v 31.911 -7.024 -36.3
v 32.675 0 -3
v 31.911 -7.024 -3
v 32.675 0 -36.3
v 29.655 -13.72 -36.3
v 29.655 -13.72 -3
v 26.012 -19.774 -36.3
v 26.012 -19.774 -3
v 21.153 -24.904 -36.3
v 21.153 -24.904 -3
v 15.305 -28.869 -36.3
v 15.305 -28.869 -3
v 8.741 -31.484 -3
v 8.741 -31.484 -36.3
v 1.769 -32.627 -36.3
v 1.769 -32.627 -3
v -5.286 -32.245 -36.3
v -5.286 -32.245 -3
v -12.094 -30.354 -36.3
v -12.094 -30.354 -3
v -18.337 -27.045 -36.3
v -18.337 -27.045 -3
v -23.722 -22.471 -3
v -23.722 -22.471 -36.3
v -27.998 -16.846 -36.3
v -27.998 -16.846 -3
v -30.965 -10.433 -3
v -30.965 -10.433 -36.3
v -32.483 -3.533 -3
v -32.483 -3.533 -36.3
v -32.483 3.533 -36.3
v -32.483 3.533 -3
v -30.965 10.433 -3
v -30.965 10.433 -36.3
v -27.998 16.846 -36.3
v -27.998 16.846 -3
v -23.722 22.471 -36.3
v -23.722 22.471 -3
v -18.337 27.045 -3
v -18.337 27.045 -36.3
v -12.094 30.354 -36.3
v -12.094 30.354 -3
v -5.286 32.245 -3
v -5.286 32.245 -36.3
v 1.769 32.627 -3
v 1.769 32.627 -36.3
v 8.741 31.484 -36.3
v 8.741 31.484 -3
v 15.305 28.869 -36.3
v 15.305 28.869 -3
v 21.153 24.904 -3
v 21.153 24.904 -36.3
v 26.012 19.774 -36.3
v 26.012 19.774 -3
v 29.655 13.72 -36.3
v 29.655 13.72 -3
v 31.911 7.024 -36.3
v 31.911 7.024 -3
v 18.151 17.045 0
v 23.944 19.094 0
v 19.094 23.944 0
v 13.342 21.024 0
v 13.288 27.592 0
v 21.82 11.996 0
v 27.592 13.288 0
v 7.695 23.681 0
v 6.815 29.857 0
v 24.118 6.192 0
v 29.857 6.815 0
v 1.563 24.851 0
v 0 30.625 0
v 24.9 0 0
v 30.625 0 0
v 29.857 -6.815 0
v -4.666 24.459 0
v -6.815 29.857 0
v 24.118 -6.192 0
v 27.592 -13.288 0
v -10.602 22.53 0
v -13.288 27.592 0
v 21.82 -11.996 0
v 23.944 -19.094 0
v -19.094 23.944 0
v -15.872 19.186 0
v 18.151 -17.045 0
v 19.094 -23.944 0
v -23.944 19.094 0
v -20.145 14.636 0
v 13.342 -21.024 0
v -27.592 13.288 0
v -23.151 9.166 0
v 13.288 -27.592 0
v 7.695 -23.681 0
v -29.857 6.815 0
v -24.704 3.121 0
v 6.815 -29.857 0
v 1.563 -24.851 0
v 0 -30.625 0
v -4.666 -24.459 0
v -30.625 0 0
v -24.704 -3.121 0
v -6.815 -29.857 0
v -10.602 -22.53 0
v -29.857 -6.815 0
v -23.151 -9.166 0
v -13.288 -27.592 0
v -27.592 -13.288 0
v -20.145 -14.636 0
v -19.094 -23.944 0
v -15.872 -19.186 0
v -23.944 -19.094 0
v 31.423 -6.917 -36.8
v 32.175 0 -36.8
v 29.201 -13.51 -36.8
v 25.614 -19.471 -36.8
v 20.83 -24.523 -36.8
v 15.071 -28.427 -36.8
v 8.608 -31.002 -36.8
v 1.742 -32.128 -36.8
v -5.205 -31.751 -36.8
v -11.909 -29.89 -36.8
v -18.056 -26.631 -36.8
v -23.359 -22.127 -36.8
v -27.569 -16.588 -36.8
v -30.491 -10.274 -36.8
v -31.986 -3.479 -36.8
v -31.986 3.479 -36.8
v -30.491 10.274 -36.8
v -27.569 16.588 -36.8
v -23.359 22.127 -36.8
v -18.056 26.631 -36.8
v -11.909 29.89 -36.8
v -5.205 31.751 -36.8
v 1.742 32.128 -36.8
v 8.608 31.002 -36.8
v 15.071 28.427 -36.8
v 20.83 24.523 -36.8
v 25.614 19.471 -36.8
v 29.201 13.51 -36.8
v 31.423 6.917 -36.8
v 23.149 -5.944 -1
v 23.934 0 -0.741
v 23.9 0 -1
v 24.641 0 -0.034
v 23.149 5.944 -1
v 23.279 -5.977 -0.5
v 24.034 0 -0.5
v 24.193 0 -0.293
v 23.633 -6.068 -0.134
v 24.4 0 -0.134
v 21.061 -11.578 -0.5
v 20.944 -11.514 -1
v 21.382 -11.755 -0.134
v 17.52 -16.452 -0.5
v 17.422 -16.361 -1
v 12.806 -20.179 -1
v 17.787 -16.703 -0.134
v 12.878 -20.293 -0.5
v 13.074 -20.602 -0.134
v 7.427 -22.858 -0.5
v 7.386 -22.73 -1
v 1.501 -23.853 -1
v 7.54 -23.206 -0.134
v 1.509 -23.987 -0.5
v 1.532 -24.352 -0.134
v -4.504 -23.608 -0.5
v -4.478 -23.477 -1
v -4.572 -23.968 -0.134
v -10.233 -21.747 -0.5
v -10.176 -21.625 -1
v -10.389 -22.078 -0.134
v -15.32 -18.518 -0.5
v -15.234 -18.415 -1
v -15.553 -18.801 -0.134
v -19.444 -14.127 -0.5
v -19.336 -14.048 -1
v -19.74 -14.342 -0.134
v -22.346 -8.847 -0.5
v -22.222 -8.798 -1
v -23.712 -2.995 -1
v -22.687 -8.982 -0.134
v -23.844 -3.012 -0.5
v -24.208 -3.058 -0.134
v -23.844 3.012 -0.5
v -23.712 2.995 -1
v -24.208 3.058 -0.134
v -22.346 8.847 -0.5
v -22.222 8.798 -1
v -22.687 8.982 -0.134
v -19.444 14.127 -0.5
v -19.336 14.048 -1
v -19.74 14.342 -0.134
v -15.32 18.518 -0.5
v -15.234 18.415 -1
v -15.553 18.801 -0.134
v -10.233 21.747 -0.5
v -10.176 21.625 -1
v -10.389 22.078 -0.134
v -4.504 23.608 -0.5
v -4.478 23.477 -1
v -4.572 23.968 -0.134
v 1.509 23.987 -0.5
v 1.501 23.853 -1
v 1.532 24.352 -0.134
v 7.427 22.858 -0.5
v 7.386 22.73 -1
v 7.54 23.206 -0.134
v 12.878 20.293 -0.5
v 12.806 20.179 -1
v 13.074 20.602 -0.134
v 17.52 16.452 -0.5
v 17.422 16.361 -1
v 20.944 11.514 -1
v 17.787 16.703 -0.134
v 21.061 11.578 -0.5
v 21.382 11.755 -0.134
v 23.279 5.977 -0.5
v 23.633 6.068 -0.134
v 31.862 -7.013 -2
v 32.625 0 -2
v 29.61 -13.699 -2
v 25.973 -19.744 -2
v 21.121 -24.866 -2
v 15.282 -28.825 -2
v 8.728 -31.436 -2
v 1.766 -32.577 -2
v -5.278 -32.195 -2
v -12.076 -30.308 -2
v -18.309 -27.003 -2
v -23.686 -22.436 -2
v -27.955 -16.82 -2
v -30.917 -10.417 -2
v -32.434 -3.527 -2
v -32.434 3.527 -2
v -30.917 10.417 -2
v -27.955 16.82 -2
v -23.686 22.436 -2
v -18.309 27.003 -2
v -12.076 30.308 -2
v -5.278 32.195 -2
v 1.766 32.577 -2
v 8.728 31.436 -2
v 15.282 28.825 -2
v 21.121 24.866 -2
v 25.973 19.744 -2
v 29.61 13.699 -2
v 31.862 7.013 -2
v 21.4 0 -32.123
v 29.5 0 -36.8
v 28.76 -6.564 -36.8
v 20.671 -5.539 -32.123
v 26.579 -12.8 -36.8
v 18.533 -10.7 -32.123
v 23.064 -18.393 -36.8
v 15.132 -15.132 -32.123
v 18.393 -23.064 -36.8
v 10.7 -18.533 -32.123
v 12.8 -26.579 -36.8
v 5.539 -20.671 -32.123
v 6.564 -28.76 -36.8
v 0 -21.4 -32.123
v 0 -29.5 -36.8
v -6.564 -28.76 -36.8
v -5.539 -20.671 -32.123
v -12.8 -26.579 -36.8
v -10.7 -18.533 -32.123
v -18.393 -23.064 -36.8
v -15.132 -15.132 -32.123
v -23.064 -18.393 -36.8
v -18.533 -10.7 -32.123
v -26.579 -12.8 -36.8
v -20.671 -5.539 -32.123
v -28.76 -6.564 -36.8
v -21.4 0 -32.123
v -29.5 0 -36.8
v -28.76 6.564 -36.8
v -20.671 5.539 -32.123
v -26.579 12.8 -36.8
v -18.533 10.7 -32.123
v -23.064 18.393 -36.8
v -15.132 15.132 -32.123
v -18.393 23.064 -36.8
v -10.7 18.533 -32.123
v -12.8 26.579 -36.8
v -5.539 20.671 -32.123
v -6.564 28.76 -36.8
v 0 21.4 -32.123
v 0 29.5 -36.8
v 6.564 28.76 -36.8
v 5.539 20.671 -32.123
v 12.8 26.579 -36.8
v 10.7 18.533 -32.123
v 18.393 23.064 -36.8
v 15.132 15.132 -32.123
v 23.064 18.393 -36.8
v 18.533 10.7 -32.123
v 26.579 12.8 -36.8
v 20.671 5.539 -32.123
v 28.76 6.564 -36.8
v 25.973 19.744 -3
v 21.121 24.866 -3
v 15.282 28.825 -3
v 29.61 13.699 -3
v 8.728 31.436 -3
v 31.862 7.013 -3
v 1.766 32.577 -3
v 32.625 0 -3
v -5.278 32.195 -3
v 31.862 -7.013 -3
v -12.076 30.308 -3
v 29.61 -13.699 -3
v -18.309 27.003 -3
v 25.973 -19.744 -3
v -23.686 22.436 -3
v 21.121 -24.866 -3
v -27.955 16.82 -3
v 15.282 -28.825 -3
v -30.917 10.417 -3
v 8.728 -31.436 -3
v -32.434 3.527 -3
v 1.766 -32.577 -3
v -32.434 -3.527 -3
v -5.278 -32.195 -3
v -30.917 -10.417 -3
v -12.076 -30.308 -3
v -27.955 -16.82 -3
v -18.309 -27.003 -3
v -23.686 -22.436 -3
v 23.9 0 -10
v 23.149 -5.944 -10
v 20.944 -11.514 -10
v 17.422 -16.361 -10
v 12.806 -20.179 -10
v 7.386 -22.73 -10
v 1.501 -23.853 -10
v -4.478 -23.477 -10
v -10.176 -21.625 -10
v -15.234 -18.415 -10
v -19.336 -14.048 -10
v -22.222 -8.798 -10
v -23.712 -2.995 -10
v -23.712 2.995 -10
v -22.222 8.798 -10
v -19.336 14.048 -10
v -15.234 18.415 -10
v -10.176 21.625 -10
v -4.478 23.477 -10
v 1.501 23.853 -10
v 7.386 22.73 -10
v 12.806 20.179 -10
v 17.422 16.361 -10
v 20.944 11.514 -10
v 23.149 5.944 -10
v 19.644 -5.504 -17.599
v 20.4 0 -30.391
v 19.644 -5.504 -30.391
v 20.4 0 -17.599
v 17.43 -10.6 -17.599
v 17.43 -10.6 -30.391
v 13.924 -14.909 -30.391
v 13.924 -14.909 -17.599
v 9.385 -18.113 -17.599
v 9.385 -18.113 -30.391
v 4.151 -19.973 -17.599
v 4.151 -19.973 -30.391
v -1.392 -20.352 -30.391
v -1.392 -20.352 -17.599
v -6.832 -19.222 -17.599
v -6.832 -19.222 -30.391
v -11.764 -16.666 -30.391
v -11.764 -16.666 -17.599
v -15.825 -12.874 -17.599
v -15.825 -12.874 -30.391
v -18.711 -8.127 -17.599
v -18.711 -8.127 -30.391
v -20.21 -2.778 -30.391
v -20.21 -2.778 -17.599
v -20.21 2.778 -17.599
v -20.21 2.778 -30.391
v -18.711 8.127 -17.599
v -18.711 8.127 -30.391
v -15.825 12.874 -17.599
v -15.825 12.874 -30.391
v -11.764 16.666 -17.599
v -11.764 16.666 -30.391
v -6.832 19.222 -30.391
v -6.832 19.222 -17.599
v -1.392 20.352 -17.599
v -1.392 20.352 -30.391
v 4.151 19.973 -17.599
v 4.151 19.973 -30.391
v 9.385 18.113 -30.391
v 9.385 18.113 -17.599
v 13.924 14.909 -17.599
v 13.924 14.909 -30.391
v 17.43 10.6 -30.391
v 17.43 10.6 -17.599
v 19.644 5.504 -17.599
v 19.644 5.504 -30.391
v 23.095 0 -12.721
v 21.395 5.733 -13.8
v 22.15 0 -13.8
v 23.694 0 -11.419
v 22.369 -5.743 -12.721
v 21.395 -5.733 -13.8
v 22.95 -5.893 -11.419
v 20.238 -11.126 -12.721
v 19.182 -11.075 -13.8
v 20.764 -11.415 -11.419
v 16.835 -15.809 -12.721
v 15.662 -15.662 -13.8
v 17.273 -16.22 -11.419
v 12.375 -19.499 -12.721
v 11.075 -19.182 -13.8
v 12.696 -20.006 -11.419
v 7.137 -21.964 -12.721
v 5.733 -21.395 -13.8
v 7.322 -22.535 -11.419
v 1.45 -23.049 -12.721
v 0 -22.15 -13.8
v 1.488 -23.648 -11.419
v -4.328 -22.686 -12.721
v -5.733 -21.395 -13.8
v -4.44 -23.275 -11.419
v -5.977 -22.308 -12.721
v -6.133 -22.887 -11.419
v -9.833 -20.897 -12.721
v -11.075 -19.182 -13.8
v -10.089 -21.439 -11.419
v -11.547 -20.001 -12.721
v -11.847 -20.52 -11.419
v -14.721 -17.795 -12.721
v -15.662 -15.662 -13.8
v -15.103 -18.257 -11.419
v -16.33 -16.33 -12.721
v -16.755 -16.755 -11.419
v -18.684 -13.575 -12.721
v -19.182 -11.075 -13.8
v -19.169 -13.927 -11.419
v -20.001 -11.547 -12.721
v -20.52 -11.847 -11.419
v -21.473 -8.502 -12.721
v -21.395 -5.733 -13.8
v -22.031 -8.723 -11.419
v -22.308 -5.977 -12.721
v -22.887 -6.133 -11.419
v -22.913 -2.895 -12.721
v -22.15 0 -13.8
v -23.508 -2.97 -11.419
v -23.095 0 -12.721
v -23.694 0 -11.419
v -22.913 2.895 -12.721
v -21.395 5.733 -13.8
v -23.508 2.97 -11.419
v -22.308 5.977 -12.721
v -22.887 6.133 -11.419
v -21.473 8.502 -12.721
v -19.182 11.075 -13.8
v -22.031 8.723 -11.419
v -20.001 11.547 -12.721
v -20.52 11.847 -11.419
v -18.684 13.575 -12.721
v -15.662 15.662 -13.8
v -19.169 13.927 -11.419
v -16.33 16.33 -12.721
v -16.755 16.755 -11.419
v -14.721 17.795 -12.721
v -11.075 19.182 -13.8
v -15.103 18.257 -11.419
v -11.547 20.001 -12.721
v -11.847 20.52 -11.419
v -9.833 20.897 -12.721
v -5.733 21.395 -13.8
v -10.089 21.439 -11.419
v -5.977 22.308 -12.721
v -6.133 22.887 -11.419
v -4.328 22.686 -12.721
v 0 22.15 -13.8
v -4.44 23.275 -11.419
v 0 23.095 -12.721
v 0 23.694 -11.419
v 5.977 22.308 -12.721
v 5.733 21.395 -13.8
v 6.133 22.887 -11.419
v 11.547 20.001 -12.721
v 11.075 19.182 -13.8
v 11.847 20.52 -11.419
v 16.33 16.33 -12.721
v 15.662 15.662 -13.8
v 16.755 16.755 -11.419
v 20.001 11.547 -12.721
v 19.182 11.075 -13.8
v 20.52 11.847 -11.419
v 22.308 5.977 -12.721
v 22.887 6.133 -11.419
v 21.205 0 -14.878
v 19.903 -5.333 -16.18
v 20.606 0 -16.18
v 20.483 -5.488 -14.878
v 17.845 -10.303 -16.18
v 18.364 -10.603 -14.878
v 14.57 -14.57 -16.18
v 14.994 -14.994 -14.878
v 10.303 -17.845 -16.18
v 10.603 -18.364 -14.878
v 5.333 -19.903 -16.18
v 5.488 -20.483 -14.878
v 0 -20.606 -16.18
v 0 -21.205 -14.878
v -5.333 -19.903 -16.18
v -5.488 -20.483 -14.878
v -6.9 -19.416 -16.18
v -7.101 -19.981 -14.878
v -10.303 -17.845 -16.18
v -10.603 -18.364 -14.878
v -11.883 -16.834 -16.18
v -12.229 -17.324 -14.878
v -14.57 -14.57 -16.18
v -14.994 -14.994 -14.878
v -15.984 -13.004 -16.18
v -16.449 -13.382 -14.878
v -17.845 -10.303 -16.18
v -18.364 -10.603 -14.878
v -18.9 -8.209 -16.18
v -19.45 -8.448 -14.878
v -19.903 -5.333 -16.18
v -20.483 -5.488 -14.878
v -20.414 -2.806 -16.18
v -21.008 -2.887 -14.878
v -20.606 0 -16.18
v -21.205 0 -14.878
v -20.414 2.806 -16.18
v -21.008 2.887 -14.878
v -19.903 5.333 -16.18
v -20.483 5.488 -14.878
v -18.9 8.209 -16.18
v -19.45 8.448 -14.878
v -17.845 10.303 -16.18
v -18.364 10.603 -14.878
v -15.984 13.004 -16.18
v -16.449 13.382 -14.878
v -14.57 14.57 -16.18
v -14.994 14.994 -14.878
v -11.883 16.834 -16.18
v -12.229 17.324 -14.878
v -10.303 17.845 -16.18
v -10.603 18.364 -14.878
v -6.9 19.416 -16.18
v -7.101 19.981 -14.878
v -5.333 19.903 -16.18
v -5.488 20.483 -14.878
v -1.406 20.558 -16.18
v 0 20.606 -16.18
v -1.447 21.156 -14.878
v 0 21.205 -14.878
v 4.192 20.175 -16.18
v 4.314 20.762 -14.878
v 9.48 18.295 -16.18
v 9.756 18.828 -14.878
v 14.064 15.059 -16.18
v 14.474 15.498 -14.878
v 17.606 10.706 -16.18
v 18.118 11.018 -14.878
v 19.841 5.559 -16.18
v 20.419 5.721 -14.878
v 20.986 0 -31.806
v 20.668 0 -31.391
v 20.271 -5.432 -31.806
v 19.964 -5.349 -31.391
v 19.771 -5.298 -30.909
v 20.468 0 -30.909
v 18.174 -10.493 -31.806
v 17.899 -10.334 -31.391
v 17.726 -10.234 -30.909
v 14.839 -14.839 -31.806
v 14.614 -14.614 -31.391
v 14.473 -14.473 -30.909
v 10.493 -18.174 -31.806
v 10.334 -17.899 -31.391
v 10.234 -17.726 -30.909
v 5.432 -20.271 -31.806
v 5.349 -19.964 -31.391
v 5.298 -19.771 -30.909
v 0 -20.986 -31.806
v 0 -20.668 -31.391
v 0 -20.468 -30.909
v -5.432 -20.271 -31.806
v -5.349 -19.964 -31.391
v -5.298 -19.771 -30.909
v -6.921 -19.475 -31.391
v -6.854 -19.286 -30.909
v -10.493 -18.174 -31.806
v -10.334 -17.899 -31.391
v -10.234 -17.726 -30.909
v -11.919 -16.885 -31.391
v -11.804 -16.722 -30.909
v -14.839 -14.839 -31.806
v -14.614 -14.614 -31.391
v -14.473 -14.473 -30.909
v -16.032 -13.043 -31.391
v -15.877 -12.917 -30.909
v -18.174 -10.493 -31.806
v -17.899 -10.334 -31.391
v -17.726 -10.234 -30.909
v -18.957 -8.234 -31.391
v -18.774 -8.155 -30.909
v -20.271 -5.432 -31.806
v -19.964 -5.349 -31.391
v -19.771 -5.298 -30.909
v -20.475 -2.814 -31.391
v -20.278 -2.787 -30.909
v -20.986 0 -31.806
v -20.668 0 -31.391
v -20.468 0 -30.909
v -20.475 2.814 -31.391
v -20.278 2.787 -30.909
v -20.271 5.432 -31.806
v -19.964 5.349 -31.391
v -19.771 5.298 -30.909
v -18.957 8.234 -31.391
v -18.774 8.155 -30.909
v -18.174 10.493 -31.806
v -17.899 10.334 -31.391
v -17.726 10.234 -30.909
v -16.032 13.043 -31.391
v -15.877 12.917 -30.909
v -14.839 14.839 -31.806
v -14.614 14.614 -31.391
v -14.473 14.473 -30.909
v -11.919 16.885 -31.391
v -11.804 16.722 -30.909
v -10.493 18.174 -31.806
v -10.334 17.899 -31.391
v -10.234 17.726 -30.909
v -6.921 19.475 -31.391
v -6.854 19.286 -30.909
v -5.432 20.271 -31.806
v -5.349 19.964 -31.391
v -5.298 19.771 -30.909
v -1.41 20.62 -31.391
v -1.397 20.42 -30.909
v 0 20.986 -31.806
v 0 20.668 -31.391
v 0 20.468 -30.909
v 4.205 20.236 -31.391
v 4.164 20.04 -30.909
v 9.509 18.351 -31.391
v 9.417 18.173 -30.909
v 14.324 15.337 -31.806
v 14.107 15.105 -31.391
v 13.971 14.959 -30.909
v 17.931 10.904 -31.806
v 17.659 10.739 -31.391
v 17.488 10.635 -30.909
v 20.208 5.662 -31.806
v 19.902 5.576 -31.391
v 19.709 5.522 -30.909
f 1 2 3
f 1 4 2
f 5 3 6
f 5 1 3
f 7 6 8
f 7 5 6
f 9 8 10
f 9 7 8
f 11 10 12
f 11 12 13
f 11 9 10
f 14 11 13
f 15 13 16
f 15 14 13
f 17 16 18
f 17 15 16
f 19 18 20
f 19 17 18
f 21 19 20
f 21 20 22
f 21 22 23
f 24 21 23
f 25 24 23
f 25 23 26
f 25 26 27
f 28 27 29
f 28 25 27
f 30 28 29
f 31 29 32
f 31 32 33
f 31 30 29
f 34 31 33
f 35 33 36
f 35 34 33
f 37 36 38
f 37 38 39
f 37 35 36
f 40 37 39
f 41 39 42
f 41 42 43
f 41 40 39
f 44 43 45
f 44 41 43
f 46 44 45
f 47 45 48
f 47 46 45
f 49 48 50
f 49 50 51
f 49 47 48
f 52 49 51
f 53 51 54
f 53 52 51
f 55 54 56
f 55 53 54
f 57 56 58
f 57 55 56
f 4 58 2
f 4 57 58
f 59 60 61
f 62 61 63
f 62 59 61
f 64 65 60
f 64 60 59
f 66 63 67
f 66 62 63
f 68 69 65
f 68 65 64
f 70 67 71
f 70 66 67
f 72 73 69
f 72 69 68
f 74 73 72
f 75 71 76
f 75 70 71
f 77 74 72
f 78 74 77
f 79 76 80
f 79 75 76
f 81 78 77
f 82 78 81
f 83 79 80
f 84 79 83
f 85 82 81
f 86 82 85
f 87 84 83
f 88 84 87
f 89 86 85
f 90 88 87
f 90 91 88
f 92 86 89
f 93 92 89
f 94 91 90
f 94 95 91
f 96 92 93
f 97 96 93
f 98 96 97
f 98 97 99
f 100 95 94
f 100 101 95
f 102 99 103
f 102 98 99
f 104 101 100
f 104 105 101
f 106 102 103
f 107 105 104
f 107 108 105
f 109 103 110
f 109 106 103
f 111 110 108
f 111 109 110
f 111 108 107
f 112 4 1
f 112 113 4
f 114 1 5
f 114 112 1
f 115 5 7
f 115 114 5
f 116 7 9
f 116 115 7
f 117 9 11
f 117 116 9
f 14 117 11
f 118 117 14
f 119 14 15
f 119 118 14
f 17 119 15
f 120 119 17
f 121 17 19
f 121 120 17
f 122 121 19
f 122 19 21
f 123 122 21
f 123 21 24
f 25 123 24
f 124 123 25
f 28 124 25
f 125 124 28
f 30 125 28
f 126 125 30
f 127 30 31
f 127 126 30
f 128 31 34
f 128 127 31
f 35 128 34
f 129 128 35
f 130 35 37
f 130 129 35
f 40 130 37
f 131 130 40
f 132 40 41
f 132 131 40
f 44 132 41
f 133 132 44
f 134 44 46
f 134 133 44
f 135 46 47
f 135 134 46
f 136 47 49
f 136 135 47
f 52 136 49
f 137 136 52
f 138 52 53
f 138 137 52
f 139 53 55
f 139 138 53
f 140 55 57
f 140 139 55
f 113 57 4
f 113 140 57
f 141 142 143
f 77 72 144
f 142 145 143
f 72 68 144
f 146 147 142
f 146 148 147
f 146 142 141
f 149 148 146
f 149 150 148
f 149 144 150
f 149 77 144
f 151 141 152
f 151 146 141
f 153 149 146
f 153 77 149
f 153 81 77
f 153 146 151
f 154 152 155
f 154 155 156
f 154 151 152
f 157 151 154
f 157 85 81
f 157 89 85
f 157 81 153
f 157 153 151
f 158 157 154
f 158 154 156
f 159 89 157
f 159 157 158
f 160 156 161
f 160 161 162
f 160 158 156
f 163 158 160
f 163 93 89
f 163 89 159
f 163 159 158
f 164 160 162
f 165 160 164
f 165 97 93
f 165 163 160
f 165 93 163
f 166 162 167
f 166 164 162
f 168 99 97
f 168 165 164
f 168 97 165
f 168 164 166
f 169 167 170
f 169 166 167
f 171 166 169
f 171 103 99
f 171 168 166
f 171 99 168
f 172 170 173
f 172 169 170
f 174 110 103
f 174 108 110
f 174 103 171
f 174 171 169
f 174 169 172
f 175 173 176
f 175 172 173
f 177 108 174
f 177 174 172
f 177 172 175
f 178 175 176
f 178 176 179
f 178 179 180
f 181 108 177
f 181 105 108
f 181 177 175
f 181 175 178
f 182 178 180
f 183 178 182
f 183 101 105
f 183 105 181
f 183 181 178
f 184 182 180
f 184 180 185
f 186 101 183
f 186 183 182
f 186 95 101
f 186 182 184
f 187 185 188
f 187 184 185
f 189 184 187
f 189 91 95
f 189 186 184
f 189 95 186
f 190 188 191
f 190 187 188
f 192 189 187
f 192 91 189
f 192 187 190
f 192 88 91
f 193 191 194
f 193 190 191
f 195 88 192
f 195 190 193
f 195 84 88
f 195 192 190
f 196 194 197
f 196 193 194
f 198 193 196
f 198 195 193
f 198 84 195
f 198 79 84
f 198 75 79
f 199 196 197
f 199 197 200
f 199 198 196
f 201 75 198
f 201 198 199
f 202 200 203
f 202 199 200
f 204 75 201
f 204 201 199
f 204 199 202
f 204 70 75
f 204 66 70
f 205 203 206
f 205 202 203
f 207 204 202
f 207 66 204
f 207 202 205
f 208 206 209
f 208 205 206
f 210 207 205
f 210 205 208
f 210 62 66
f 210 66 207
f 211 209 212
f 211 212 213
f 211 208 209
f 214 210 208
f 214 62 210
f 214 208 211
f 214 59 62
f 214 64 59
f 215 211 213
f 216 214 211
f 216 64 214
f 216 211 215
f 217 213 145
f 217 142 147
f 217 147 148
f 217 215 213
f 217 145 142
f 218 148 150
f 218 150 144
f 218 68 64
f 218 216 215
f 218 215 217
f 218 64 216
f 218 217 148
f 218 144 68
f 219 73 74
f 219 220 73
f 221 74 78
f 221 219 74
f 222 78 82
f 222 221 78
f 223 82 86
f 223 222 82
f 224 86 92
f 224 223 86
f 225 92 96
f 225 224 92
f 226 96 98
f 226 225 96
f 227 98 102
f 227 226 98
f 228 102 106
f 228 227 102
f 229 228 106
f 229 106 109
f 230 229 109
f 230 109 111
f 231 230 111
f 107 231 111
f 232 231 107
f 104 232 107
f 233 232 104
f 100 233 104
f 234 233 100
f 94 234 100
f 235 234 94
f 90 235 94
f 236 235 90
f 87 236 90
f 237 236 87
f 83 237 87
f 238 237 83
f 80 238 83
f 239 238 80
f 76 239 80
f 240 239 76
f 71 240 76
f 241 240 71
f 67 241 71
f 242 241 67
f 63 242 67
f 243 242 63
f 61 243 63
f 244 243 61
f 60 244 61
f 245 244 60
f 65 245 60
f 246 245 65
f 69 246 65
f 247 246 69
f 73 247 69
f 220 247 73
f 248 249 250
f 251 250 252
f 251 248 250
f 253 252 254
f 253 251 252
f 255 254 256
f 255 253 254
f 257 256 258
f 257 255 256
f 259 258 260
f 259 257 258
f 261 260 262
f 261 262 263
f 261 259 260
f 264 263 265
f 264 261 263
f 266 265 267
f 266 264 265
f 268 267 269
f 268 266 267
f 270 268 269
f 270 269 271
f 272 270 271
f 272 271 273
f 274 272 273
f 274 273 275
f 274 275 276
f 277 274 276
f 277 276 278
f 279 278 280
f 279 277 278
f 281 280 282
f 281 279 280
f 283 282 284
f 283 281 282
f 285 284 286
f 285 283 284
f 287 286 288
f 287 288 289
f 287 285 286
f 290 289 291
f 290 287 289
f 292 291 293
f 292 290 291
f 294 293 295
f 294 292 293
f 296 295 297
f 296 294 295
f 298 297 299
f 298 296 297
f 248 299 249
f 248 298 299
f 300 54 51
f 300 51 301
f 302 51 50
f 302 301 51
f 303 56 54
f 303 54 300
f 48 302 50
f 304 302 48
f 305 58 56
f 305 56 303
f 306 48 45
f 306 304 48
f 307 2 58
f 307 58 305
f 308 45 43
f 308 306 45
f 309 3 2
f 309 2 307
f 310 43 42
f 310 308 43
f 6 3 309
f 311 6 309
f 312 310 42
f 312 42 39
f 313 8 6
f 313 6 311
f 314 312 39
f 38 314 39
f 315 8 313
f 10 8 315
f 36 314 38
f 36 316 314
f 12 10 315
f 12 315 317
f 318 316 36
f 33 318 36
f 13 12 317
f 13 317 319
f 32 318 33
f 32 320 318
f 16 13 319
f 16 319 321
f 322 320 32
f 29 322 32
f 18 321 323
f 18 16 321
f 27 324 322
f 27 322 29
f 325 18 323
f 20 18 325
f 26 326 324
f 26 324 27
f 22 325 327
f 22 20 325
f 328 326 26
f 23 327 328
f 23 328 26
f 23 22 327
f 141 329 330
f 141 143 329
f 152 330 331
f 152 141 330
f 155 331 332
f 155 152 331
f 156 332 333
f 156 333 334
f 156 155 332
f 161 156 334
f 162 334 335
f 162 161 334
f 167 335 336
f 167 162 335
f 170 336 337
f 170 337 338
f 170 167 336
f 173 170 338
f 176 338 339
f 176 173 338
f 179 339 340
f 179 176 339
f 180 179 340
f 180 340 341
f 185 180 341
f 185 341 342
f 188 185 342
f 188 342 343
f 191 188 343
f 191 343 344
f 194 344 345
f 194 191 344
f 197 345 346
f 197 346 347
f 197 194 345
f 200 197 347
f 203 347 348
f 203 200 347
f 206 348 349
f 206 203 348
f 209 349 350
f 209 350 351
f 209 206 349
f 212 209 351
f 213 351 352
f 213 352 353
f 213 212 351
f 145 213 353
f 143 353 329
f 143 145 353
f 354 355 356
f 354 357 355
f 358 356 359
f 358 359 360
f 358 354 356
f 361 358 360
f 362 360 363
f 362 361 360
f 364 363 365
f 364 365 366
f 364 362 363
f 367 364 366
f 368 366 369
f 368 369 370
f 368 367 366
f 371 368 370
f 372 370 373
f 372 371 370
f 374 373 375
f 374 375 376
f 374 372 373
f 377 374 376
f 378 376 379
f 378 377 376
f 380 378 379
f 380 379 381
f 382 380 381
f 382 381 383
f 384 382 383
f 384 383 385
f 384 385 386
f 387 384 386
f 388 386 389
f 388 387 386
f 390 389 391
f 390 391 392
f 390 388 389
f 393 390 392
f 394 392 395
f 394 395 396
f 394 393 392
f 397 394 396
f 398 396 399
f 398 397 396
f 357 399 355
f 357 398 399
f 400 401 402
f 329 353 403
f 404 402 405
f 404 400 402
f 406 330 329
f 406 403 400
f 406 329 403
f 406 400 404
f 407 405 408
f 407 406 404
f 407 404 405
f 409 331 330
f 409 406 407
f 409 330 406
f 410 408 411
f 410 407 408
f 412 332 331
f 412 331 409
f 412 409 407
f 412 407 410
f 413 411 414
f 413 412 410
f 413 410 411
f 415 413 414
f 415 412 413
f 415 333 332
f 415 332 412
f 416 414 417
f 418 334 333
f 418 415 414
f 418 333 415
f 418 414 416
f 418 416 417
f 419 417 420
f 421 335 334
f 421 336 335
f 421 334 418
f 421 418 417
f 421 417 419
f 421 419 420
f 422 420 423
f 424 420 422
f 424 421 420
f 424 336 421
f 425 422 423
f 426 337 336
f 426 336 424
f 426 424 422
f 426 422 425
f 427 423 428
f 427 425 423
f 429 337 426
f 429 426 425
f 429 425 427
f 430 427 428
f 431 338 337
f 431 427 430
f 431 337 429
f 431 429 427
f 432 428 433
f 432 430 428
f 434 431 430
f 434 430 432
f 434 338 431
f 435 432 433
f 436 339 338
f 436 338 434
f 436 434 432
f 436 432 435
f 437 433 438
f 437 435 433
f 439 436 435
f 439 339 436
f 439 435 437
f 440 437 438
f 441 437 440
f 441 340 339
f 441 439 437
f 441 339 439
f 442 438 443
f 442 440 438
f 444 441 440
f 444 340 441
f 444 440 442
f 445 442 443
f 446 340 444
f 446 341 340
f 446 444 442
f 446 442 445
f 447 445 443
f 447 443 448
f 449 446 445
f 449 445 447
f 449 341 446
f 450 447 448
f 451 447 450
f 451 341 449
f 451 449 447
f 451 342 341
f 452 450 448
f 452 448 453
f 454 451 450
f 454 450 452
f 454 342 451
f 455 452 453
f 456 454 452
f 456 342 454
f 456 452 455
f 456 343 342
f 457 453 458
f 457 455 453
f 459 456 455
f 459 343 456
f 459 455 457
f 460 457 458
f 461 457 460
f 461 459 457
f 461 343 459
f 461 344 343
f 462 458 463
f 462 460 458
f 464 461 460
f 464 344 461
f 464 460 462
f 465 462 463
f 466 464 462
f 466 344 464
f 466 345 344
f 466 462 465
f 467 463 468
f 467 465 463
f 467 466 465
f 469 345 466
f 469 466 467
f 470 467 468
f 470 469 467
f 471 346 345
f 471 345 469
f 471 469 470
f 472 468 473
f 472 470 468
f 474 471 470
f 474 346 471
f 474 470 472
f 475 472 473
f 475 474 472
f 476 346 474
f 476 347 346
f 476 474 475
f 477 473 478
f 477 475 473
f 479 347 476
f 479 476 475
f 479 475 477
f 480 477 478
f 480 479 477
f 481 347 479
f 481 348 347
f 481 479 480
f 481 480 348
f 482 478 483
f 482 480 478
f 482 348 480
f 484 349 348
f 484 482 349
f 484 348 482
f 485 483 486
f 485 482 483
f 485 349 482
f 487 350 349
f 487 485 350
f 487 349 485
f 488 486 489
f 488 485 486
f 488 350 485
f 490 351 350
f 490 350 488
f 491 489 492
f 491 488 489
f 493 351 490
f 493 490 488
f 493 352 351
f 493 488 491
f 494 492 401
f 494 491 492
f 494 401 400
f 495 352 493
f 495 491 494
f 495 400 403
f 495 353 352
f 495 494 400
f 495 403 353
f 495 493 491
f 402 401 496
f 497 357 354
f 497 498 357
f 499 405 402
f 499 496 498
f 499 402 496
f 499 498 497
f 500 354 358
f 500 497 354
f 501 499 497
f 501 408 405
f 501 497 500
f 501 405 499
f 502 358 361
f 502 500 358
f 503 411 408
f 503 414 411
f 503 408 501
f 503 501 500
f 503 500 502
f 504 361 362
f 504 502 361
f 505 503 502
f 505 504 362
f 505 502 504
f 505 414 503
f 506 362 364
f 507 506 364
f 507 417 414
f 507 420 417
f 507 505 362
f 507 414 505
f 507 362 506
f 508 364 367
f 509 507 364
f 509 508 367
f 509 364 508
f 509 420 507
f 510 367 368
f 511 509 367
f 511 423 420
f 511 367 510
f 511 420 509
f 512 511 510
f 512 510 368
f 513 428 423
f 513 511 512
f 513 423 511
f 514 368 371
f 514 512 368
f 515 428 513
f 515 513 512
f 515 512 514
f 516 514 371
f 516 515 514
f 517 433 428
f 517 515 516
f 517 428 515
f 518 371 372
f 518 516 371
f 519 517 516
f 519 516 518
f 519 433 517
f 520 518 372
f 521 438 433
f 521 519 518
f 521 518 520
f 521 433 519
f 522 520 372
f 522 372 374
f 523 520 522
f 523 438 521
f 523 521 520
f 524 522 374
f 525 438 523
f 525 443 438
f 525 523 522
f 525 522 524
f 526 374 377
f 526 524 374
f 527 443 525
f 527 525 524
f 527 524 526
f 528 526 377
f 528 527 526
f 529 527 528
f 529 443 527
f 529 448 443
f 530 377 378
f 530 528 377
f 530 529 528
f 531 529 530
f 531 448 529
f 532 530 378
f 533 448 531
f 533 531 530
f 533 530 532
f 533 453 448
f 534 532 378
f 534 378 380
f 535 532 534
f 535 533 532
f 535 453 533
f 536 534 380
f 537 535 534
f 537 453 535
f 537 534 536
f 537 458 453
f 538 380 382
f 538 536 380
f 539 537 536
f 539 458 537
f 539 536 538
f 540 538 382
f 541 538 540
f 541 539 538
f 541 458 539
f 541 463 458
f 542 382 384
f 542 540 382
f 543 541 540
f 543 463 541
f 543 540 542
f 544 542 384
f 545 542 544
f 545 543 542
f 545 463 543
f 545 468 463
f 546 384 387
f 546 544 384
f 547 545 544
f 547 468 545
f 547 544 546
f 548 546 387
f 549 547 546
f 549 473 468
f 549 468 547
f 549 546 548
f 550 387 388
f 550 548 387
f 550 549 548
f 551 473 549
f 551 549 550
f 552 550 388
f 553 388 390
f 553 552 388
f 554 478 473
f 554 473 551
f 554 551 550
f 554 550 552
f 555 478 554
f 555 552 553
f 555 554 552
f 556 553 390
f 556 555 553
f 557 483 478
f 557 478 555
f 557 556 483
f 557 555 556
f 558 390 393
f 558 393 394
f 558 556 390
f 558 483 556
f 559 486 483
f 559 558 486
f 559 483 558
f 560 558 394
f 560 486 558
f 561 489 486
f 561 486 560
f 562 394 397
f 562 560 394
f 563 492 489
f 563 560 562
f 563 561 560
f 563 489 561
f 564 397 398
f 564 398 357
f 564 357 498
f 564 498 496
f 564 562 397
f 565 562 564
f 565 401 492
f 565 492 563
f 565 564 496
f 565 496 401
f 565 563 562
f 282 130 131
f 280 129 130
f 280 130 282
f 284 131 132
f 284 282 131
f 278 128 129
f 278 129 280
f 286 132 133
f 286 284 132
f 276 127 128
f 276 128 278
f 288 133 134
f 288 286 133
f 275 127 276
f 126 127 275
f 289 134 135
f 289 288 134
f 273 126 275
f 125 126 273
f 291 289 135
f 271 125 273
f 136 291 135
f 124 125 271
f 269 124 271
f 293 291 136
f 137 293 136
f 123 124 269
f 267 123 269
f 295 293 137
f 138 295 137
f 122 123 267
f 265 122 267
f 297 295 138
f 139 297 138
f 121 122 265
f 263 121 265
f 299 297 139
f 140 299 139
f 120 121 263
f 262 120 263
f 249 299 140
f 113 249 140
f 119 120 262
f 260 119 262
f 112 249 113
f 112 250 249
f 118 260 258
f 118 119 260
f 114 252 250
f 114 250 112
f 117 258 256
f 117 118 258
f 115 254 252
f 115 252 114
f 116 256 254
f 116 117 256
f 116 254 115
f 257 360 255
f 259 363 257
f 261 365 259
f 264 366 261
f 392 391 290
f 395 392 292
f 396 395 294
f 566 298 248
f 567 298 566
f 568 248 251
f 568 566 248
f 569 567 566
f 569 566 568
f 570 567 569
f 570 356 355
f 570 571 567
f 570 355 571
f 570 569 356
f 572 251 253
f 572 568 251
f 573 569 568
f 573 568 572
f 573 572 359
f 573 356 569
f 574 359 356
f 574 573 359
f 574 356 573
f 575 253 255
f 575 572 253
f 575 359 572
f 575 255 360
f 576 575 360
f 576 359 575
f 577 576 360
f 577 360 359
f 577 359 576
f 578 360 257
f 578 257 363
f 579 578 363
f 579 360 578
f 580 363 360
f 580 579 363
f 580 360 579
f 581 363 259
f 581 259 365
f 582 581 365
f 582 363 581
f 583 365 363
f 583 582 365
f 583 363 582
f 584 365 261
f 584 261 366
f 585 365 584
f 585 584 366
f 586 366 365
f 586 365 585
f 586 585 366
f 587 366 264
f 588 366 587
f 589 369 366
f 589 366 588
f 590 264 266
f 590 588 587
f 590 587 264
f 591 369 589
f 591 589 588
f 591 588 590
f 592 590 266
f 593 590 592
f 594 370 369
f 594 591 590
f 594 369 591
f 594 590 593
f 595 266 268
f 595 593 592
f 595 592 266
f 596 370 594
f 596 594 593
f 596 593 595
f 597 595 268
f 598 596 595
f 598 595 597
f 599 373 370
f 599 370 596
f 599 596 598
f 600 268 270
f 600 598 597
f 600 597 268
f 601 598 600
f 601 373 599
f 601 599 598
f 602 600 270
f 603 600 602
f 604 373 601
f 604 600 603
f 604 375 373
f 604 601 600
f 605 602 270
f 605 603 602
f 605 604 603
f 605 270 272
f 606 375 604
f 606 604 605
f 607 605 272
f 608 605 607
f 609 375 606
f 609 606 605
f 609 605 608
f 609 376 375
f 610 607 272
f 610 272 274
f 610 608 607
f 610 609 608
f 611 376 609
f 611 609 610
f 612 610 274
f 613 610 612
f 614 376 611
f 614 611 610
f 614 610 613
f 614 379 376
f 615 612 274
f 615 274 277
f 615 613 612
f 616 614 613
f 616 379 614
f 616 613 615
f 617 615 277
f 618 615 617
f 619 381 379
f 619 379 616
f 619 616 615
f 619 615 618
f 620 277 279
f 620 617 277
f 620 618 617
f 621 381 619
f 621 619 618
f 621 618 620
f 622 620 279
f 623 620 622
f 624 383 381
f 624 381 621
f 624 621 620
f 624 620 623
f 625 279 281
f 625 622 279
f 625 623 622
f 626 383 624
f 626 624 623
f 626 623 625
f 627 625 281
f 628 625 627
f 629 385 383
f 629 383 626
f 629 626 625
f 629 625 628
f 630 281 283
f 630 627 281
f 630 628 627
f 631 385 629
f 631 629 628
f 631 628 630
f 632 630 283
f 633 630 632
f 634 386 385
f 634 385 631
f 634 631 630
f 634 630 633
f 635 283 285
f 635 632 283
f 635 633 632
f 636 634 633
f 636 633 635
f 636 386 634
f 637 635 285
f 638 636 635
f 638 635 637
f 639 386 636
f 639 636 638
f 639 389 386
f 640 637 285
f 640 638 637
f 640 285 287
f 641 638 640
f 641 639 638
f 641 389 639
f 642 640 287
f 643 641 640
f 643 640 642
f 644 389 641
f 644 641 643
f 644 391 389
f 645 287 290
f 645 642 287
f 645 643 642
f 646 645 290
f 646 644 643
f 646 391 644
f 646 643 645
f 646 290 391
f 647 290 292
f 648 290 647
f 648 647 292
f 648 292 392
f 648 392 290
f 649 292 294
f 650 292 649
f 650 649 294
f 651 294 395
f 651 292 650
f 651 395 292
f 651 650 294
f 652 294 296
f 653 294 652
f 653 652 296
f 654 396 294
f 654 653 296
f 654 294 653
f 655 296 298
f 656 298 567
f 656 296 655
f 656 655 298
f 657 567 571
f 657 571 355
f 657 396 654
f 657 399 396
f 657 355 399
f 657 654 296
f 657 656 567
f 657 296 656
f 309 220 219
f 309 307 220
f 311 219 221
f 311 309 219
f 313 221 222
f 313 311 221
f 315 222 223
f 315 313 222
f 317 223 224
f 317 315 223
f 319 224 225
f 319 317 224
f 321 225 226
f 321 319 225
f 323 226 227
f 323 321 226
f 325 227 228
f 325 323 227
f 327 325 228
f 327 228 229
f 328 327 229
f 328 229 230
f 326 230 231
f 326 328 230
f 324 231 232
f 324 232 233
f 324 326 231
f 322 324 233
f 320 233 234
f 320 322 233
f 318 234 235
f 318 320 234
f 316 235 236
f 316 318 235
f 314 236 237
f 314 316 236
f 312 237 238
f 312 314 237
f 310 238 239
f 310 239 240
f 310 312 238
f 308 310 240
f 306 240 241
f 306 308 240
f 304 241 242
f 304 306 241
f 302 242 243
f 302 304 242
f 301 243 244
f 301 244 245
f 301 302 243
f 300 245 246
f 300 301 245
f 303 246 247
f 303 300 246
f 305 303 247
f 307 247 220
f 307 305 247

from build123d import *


with BuildPart() as part:
    # Sketch1 → Revolve1 (revolve)
    with BuildSketch(Plane(origin=(0, 0, 0), x_dir=(0, 0, -1), z_dir=(1, 0, 0)), mode=Mode.PRIVATE) as revolve1_sk:
        with BuildLine():
            Line((2, 32.625), (3, 32.625))
            Line((3, 32.625), (3, 32.675))
            Line((3, 32.675), (36.3, 32.675))
            Line((36.3, 32.675), (36.8, 32.175))
            Line((36.8, 32.175), (36.8, 29.5))
            Line((36.8, 29.5), (32.12346282, 21.4))
            ThreePointArc((32.12346282, 21.4), (31.391412012, 20.667949192), (30.391412012, 20.4))
            Line((30.391412012, 20.4), (17.599342077, 20.4))
            ThreePointArc((17.599342077, 20.4), (15.50769201, 20.858524469), (13.799671038, 22.15))
            ThreePointArc((13.799671038, 22.15), (12.091650066, 23.441475531), (10, 23.9))
            Line((10, 23.9), (1, 23.9))
            ThreePointArc((1, 23.9), (0.292893219, 24.192893219), (0, 24.9))
            Line((0, 24.9), (0, 30.625))
            Line((0, 30.625), (2, 32.625))
        make_face()
    revolve(revolve1_sk.sketch.rotate(Axis((0, 0, 0), (0, 0, -1)), 90), axis=Axis((0, 0, 0), (0, 0, -1)))


solid = part.part
